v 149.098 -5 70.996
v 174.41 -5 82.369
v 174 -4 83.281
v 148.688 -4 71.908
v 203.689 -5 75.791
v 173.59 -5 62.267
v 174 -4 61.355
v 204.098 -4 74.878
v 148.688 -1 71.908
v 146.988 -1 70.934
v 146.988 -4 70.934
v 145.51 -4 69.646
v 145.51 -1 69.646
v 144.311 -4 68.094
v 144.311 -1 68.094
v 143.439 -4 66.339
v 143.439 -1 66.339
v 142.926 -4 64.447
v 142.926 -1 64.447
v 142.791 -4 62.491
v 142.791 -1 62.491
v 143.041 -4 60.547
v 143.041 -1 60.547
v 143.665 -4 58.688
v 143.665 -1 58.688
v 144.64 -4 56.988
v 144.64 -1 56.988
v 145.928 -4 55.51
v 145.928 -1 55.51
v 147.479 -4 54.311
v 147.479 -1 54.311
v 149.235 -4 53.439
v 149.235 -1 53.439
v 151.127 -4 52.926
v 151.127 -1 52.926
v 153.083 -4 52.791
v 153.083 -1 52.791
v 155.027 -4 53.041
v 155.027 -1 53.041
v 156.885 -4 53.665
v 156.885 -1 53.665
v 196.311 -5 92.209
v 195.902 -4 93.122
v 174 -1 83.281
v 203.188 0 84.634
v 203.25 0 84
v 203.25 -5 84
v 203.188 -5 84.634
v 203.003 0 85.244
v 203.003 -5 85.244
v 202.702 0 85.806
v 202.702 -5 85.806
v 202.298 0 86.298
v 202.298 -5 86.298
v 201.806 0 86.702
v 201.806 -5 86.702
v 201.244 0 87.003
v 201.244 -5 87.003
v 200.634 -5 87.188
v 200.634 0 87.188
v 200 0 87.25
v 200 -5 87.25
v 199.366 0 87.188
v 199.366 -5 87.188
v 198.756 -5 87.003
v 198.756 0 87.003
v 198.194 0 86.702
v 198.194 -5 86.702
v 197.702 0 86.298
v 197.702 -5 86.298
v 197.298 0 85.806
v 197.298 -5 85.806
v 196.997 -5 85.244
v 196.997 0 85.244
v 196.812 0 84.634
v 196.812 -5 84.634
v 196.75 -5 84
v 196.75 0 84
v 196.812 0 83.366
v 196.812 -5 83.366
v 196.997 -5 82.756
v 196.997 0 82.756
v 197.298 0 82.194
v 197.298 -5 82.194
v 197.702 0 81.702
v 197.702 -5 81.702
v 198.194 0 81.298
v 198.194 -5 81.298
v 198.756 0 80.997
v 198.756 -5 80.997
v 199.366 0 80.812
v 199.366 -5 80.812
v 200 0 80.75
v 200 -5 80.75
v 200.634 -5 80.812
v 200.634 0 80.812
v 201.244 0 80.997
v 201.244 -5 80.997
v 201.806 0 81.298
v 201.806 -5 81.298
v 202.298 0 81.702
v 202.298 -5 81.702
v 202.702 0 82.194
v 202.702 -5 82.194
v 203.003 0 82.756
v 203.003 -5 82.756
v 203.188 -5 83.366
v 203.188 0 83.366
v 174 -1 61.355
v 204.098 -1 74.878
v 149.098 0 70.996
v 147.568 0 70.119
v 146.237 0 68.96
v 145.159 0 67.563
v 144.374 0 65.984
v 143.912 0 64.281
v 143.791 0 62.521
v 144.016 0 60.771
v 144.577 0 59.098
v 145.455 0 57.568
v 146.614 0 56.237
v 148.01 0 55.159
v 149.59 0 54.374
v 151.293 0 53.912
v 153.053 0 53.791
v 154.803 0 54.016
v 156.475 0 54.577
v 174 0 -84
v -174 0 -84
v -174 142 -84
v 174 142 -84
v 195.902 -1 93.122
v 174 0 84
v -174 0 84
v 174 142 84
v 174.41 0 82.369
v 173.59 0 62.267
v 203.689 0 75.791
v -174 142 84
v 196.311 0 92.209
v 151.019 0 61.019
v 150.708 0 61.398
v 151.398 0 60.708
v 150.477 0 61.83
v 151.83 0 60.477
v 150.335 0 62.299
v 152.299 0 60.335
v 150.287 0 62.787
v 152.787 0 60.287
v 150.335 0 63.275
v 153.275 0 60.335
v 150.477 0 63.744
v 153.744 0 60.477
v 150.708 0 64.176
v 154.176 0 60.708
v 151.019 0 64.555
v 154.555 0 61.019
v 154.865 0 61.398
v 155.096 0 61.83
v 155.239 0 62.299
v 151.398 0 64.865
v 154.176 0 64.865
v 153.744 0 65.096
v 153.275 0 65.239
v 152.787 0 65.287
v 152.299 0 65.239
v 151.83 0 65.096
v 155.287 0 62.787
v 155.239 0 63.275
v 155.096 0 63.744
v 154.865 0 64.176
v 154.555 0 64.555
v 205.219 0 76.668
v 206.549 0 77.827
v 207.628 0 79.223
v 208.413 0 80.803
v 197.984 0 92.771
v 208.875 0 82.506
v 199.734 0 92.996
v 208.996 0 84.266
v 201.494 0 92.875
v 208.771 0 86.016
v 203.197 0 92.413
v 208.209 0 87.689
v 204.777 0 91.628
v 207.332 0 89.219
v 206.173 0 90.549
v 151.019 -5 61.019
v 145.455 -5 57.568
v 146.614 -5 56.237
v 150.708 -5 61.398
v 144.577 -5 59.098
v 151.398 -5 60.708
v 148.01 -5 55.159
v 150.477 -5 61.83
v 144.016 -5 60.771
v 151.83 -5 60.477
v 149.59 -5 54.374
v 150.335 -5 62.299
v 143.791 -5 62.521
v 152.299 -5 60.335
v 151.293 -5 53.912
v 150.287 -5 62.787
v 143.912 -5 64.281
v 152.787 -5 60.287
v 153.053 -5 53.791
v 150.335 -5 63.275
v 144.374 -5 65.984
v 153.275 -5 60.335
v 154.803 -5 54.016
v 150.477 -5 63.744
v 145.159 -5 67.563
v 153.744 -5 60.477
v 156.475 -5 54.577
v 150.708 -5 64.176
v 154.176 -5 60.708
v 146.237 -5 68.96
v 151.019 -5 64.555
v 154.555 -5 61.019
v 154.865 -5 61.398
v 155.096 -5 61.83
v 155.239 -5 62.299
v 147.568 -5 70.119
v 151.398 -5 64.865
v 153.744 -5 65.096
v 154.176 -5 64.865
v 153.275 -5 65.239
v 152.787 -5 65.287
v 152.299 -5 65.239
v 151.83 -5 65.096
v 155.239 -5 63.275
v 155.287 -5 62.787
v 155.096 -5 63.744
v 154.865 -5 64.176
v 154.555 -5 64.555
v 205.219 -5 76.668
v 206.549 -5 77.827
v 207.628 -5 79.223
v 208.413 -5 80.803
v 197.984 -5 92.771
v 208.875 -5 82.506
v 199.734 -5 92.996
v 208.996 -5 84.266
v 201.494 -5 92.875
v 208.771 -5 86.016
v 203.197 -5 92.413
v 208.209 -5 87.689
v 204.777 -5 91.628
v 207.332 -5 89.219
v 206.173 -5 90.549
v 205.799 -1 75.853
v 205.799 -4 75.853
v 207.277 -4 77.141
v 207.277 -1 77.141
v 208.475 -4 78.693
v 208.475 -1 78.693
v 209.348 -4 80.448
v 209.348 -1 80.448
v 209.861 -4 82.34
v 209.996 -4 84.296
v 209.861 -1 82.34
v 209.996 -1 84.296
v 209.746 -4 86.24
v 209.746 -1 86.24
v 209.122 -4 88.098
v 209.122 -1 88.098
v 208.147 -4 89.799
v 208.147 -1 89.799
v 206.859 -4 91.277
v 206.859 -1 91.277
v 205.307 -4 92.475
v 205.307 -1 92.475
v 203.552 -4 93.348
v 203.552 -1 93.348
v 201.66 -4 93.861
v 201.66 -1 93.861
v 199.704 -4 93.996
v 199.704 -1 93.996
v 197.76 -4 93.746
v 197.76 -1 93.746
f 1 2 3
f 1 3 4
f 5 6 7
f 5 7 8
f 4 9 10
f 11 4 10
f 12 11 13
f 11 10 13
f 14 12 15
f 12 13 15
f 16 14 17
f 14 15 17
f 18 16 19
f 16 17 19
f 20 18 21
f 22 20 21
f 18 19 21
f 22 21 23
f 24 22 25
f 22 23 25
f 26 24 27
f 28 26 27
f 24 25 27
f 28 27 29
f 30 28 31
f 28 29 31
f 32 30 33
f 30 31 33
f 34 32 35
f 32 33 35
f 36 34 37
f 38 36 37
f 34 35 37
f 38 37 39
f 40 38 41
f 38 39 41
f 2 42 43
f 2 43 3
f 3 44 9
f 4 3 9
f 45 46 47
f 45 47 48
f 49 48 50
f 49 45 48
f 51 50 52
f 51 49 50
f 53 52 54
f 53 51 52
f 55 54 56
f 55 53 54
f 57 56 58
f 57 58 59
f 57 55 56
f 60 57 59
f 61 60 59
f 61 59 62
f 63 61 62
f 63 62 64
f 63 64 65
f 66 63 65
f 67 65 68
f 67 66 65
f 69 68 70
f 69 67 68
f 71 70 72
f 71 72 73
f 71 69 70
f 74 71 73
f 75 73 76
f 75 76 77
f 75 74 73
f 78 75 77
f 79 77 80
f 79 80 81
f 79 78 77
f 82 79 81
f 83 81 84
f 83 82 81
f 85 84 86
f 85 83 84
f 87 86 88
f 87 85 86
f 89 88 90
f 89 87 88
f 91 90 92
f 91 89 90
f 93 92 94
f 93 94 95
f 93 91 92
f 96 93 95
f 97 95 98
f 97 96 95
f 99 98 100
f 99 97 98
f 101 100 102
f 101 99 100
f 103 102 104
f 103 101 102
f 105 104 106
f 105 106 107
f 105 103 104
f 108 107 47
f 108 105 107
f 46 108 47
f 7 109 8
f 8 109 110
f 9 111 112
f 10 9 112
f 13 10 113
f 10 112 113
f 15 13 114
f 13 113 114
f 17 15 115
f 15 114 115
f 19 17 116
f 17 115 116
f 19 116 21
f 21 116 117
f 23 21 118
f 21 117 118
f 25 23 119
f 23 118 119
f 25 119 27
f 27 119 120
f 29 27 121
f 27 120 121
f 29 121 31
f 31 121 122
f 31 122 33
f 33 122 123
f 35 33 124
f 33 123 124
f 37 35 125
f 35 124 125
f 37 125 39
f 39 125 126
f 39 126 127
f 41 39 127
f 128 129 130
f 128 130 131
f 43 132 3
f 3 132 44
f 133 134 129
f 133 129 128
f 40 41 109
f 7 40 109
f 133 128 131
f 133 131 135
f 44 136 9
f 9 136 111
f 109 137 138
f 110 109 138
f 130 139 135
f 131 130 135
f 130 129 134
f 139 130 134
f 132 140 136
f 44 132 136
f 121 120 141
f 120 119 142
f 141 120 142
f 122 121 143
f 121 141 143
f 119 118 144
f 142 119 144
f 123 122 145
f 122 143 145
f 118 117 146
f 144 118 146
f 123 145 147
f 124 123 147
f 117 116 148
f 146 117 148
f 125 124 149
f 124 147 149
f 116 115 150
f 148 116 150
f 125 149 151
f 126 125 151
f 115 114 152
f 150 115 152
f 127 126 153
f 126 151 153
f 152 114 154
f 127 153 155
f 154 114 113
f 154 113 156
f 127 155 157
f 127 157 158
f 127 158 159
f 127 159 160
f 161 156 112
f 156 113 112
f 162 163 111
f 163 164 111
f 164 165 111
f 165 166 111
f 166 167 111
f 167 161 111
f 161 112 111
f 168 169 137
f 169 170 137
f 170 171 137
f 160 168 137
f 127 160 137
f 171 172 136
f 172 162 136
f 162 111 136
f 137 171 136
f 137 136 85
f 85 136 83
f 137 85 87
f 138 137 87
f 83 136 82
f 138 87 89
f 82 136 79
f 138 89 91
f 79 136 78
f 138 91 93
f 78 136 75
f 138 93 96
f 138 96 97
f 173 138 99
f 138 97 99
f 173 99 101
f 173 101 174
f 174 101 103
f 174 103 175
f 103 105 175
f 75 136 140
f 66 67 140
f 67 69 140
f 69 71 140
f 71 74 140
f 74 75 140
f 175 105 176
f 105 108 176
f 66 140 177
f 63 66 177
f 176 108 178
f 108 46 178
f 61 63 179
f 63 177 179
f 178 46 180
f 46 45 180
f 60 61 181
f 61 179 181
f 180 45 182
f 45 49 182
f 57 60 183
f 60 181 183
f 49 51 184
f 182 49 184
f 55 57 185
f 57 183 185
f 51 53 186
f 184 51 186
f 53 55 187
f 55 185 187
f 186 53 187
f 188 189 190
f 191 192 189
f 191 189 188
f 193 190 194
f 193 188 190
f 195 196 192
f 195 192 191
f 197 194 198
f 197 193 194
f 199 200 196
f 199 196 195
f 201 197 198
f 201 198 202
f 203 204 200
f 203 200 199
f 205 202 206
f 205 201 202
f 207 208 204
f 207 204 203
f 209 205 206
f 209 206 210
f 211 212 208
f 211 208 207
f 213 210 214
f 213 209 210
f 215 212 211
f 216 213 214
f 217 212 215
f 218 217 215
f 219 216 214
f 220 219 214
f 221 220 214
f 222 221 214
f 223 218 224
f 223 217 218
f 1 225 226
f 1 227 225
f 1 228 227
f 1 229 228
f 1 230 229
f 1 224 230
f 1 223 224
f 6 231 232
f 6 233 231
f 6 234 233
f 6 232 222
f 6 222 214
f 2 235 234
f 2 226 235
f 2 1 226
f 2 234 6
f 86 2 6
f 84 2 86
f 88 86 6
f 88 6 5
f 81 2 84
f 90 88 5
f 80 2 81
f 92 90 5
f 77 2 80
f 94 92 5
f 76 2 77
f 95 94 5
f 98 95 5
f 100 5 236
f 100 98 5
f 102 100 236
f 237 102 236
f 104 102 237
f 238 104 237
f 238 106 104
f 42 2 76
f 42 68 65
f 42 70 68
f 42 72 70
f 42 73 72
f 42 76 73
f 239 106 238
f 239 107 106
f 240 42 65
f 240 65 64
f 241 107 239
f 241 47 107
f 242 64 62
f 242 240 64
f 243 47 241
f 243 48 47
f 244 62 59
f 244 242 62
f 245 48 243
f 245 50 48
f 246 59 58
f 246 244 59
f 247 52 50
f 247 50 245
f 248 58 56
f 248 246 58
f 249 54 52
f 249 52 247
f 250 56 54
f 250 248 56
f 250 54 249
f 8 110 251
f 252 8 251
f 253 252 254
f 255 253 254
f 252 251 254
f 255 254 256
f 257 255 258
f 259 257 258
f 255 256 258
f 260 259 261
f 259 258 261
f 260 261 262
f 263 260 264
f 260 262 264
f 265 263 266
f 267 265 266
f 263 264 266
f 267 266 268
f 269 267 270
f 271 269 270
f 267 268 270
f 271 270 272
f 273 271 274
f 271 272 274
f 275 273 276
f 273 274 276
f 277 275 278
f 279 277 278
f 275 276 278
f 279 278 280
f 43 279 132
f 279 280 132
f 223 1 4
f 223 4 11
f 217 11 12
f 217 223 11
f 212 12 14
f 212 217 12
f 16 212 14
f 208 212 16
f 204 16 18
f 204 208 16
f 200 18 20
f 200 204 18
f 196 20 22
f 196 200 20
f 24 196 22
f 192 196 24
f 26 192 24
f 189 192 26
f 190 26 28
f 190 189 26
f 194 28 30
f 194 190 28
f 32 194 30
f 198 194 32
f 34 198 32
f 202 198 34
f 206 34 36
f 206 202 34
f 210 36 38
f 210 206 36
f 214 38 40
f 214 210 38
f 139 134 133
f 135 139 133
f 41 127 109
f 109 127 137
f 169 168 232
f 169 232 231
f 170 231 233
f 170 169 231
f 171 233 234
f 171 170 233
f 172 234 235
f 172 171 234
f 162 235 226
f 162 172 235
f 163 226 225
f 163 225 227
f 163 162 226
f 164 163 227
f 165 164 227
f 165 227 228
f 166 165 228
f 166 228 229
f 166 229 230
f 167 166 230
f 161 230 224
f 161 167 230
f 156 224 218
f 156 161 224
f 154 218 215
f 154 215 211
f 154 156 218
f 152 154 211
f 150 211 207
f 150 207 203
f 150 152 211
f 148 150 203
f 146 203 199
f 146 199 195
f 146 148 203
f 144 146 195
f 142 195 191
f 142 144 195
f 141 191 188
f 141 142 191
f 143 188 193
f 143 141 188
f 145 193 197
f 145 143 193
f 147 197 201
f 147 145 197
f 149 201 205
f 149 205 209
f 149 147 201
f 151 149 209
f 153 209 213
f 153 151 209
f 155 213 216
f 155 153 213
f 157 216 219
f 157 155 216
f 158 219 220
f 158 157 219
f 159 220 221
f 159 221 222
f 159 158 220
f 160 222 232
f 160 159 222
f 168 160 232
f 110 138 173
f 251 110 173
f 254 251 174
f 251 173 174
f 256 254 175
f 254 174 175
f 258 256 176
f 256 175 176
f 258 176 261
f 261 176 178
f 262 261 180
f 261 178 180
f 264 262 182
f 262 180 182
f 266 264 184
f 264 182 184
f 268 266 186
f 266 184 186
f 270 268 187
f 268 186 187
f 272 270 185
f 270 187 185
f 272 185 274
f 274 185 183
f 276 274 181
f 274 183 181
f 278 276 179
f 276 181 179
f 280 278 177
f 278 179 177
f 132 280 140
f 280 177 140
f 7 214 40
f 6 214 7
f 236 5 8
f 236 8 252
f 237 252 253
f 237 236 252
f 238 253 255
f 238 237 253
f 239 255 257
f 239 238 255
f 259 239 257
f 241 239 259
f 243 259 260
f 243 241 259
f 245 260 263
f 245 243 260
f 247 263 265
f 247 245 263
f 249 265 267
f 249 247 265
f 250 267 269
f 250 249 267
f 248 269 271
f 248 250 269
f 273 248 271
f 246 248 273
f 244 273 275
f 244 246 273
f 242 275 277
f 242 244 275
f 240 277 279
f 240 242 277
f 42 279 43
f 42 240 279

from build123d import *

# Parameters (mm, degrees)
F0_W     = 348
F0_H     = 168
F1_DEPTH = 142
F2_R     = 3.25
F2_R_2   = 2.5
F3_DEPTH = 5
F4_SIZE  = 1


with BuildPart() as f1:
    # F0 (on Front) → F1 (new body)
    with BuildSketch(Plane.XZ):
        Rectangle(F0_W, F0_H)
    extrude(amount=-F1_DEPTH)


with BuildPart() as f3:
    # F2 (on face) → F3 (new body)
    with BuildSketch(Plane.XZ):
        with BuildLine():
            Line((174, 61.355016), (204.098386, 74.87842))
            ThreePointArc((204.098386, 74.87842), (209.12158, 88.098386), (195.901614, 93.12158))
            Line((195.901614, 93.12158), (174, 83.281041))
            Line((174, 83.281041), (174, 61.355016))
        make_face()
        with Locations((200, 84)):
            Circle(F2_R, mode=Mode.SUBTRACT)
        with BuildLine():
            Line((156.885183, 53.665216), (174, 61.355016))
            Line((174, 61.355016), (174, 83.281041))
            Line((174, 83.281041), (148.68841, 71.908377))
            ThreePointArc((148.68841, 71.908377), (143.665216, 58.68841), (156.885183, 53.665216))
        make_face()
        with Locations((152.786797, 62.786797)):
            Circle(F2_R_2, mode=Mode.SUBTRACT)
    extrude(amount=F3_DEPTH)

    # F4
    f4_edges = [f3.edges().sort_by_distance(p)[0] for p in [
        (172.295012, -5, 82.514979),
        (172.295012, 0, 82.514979),
    ]]
    chamfer(f4_edges, length=F4_SIZE)


solid = Compound([f1.part, f3.part])
